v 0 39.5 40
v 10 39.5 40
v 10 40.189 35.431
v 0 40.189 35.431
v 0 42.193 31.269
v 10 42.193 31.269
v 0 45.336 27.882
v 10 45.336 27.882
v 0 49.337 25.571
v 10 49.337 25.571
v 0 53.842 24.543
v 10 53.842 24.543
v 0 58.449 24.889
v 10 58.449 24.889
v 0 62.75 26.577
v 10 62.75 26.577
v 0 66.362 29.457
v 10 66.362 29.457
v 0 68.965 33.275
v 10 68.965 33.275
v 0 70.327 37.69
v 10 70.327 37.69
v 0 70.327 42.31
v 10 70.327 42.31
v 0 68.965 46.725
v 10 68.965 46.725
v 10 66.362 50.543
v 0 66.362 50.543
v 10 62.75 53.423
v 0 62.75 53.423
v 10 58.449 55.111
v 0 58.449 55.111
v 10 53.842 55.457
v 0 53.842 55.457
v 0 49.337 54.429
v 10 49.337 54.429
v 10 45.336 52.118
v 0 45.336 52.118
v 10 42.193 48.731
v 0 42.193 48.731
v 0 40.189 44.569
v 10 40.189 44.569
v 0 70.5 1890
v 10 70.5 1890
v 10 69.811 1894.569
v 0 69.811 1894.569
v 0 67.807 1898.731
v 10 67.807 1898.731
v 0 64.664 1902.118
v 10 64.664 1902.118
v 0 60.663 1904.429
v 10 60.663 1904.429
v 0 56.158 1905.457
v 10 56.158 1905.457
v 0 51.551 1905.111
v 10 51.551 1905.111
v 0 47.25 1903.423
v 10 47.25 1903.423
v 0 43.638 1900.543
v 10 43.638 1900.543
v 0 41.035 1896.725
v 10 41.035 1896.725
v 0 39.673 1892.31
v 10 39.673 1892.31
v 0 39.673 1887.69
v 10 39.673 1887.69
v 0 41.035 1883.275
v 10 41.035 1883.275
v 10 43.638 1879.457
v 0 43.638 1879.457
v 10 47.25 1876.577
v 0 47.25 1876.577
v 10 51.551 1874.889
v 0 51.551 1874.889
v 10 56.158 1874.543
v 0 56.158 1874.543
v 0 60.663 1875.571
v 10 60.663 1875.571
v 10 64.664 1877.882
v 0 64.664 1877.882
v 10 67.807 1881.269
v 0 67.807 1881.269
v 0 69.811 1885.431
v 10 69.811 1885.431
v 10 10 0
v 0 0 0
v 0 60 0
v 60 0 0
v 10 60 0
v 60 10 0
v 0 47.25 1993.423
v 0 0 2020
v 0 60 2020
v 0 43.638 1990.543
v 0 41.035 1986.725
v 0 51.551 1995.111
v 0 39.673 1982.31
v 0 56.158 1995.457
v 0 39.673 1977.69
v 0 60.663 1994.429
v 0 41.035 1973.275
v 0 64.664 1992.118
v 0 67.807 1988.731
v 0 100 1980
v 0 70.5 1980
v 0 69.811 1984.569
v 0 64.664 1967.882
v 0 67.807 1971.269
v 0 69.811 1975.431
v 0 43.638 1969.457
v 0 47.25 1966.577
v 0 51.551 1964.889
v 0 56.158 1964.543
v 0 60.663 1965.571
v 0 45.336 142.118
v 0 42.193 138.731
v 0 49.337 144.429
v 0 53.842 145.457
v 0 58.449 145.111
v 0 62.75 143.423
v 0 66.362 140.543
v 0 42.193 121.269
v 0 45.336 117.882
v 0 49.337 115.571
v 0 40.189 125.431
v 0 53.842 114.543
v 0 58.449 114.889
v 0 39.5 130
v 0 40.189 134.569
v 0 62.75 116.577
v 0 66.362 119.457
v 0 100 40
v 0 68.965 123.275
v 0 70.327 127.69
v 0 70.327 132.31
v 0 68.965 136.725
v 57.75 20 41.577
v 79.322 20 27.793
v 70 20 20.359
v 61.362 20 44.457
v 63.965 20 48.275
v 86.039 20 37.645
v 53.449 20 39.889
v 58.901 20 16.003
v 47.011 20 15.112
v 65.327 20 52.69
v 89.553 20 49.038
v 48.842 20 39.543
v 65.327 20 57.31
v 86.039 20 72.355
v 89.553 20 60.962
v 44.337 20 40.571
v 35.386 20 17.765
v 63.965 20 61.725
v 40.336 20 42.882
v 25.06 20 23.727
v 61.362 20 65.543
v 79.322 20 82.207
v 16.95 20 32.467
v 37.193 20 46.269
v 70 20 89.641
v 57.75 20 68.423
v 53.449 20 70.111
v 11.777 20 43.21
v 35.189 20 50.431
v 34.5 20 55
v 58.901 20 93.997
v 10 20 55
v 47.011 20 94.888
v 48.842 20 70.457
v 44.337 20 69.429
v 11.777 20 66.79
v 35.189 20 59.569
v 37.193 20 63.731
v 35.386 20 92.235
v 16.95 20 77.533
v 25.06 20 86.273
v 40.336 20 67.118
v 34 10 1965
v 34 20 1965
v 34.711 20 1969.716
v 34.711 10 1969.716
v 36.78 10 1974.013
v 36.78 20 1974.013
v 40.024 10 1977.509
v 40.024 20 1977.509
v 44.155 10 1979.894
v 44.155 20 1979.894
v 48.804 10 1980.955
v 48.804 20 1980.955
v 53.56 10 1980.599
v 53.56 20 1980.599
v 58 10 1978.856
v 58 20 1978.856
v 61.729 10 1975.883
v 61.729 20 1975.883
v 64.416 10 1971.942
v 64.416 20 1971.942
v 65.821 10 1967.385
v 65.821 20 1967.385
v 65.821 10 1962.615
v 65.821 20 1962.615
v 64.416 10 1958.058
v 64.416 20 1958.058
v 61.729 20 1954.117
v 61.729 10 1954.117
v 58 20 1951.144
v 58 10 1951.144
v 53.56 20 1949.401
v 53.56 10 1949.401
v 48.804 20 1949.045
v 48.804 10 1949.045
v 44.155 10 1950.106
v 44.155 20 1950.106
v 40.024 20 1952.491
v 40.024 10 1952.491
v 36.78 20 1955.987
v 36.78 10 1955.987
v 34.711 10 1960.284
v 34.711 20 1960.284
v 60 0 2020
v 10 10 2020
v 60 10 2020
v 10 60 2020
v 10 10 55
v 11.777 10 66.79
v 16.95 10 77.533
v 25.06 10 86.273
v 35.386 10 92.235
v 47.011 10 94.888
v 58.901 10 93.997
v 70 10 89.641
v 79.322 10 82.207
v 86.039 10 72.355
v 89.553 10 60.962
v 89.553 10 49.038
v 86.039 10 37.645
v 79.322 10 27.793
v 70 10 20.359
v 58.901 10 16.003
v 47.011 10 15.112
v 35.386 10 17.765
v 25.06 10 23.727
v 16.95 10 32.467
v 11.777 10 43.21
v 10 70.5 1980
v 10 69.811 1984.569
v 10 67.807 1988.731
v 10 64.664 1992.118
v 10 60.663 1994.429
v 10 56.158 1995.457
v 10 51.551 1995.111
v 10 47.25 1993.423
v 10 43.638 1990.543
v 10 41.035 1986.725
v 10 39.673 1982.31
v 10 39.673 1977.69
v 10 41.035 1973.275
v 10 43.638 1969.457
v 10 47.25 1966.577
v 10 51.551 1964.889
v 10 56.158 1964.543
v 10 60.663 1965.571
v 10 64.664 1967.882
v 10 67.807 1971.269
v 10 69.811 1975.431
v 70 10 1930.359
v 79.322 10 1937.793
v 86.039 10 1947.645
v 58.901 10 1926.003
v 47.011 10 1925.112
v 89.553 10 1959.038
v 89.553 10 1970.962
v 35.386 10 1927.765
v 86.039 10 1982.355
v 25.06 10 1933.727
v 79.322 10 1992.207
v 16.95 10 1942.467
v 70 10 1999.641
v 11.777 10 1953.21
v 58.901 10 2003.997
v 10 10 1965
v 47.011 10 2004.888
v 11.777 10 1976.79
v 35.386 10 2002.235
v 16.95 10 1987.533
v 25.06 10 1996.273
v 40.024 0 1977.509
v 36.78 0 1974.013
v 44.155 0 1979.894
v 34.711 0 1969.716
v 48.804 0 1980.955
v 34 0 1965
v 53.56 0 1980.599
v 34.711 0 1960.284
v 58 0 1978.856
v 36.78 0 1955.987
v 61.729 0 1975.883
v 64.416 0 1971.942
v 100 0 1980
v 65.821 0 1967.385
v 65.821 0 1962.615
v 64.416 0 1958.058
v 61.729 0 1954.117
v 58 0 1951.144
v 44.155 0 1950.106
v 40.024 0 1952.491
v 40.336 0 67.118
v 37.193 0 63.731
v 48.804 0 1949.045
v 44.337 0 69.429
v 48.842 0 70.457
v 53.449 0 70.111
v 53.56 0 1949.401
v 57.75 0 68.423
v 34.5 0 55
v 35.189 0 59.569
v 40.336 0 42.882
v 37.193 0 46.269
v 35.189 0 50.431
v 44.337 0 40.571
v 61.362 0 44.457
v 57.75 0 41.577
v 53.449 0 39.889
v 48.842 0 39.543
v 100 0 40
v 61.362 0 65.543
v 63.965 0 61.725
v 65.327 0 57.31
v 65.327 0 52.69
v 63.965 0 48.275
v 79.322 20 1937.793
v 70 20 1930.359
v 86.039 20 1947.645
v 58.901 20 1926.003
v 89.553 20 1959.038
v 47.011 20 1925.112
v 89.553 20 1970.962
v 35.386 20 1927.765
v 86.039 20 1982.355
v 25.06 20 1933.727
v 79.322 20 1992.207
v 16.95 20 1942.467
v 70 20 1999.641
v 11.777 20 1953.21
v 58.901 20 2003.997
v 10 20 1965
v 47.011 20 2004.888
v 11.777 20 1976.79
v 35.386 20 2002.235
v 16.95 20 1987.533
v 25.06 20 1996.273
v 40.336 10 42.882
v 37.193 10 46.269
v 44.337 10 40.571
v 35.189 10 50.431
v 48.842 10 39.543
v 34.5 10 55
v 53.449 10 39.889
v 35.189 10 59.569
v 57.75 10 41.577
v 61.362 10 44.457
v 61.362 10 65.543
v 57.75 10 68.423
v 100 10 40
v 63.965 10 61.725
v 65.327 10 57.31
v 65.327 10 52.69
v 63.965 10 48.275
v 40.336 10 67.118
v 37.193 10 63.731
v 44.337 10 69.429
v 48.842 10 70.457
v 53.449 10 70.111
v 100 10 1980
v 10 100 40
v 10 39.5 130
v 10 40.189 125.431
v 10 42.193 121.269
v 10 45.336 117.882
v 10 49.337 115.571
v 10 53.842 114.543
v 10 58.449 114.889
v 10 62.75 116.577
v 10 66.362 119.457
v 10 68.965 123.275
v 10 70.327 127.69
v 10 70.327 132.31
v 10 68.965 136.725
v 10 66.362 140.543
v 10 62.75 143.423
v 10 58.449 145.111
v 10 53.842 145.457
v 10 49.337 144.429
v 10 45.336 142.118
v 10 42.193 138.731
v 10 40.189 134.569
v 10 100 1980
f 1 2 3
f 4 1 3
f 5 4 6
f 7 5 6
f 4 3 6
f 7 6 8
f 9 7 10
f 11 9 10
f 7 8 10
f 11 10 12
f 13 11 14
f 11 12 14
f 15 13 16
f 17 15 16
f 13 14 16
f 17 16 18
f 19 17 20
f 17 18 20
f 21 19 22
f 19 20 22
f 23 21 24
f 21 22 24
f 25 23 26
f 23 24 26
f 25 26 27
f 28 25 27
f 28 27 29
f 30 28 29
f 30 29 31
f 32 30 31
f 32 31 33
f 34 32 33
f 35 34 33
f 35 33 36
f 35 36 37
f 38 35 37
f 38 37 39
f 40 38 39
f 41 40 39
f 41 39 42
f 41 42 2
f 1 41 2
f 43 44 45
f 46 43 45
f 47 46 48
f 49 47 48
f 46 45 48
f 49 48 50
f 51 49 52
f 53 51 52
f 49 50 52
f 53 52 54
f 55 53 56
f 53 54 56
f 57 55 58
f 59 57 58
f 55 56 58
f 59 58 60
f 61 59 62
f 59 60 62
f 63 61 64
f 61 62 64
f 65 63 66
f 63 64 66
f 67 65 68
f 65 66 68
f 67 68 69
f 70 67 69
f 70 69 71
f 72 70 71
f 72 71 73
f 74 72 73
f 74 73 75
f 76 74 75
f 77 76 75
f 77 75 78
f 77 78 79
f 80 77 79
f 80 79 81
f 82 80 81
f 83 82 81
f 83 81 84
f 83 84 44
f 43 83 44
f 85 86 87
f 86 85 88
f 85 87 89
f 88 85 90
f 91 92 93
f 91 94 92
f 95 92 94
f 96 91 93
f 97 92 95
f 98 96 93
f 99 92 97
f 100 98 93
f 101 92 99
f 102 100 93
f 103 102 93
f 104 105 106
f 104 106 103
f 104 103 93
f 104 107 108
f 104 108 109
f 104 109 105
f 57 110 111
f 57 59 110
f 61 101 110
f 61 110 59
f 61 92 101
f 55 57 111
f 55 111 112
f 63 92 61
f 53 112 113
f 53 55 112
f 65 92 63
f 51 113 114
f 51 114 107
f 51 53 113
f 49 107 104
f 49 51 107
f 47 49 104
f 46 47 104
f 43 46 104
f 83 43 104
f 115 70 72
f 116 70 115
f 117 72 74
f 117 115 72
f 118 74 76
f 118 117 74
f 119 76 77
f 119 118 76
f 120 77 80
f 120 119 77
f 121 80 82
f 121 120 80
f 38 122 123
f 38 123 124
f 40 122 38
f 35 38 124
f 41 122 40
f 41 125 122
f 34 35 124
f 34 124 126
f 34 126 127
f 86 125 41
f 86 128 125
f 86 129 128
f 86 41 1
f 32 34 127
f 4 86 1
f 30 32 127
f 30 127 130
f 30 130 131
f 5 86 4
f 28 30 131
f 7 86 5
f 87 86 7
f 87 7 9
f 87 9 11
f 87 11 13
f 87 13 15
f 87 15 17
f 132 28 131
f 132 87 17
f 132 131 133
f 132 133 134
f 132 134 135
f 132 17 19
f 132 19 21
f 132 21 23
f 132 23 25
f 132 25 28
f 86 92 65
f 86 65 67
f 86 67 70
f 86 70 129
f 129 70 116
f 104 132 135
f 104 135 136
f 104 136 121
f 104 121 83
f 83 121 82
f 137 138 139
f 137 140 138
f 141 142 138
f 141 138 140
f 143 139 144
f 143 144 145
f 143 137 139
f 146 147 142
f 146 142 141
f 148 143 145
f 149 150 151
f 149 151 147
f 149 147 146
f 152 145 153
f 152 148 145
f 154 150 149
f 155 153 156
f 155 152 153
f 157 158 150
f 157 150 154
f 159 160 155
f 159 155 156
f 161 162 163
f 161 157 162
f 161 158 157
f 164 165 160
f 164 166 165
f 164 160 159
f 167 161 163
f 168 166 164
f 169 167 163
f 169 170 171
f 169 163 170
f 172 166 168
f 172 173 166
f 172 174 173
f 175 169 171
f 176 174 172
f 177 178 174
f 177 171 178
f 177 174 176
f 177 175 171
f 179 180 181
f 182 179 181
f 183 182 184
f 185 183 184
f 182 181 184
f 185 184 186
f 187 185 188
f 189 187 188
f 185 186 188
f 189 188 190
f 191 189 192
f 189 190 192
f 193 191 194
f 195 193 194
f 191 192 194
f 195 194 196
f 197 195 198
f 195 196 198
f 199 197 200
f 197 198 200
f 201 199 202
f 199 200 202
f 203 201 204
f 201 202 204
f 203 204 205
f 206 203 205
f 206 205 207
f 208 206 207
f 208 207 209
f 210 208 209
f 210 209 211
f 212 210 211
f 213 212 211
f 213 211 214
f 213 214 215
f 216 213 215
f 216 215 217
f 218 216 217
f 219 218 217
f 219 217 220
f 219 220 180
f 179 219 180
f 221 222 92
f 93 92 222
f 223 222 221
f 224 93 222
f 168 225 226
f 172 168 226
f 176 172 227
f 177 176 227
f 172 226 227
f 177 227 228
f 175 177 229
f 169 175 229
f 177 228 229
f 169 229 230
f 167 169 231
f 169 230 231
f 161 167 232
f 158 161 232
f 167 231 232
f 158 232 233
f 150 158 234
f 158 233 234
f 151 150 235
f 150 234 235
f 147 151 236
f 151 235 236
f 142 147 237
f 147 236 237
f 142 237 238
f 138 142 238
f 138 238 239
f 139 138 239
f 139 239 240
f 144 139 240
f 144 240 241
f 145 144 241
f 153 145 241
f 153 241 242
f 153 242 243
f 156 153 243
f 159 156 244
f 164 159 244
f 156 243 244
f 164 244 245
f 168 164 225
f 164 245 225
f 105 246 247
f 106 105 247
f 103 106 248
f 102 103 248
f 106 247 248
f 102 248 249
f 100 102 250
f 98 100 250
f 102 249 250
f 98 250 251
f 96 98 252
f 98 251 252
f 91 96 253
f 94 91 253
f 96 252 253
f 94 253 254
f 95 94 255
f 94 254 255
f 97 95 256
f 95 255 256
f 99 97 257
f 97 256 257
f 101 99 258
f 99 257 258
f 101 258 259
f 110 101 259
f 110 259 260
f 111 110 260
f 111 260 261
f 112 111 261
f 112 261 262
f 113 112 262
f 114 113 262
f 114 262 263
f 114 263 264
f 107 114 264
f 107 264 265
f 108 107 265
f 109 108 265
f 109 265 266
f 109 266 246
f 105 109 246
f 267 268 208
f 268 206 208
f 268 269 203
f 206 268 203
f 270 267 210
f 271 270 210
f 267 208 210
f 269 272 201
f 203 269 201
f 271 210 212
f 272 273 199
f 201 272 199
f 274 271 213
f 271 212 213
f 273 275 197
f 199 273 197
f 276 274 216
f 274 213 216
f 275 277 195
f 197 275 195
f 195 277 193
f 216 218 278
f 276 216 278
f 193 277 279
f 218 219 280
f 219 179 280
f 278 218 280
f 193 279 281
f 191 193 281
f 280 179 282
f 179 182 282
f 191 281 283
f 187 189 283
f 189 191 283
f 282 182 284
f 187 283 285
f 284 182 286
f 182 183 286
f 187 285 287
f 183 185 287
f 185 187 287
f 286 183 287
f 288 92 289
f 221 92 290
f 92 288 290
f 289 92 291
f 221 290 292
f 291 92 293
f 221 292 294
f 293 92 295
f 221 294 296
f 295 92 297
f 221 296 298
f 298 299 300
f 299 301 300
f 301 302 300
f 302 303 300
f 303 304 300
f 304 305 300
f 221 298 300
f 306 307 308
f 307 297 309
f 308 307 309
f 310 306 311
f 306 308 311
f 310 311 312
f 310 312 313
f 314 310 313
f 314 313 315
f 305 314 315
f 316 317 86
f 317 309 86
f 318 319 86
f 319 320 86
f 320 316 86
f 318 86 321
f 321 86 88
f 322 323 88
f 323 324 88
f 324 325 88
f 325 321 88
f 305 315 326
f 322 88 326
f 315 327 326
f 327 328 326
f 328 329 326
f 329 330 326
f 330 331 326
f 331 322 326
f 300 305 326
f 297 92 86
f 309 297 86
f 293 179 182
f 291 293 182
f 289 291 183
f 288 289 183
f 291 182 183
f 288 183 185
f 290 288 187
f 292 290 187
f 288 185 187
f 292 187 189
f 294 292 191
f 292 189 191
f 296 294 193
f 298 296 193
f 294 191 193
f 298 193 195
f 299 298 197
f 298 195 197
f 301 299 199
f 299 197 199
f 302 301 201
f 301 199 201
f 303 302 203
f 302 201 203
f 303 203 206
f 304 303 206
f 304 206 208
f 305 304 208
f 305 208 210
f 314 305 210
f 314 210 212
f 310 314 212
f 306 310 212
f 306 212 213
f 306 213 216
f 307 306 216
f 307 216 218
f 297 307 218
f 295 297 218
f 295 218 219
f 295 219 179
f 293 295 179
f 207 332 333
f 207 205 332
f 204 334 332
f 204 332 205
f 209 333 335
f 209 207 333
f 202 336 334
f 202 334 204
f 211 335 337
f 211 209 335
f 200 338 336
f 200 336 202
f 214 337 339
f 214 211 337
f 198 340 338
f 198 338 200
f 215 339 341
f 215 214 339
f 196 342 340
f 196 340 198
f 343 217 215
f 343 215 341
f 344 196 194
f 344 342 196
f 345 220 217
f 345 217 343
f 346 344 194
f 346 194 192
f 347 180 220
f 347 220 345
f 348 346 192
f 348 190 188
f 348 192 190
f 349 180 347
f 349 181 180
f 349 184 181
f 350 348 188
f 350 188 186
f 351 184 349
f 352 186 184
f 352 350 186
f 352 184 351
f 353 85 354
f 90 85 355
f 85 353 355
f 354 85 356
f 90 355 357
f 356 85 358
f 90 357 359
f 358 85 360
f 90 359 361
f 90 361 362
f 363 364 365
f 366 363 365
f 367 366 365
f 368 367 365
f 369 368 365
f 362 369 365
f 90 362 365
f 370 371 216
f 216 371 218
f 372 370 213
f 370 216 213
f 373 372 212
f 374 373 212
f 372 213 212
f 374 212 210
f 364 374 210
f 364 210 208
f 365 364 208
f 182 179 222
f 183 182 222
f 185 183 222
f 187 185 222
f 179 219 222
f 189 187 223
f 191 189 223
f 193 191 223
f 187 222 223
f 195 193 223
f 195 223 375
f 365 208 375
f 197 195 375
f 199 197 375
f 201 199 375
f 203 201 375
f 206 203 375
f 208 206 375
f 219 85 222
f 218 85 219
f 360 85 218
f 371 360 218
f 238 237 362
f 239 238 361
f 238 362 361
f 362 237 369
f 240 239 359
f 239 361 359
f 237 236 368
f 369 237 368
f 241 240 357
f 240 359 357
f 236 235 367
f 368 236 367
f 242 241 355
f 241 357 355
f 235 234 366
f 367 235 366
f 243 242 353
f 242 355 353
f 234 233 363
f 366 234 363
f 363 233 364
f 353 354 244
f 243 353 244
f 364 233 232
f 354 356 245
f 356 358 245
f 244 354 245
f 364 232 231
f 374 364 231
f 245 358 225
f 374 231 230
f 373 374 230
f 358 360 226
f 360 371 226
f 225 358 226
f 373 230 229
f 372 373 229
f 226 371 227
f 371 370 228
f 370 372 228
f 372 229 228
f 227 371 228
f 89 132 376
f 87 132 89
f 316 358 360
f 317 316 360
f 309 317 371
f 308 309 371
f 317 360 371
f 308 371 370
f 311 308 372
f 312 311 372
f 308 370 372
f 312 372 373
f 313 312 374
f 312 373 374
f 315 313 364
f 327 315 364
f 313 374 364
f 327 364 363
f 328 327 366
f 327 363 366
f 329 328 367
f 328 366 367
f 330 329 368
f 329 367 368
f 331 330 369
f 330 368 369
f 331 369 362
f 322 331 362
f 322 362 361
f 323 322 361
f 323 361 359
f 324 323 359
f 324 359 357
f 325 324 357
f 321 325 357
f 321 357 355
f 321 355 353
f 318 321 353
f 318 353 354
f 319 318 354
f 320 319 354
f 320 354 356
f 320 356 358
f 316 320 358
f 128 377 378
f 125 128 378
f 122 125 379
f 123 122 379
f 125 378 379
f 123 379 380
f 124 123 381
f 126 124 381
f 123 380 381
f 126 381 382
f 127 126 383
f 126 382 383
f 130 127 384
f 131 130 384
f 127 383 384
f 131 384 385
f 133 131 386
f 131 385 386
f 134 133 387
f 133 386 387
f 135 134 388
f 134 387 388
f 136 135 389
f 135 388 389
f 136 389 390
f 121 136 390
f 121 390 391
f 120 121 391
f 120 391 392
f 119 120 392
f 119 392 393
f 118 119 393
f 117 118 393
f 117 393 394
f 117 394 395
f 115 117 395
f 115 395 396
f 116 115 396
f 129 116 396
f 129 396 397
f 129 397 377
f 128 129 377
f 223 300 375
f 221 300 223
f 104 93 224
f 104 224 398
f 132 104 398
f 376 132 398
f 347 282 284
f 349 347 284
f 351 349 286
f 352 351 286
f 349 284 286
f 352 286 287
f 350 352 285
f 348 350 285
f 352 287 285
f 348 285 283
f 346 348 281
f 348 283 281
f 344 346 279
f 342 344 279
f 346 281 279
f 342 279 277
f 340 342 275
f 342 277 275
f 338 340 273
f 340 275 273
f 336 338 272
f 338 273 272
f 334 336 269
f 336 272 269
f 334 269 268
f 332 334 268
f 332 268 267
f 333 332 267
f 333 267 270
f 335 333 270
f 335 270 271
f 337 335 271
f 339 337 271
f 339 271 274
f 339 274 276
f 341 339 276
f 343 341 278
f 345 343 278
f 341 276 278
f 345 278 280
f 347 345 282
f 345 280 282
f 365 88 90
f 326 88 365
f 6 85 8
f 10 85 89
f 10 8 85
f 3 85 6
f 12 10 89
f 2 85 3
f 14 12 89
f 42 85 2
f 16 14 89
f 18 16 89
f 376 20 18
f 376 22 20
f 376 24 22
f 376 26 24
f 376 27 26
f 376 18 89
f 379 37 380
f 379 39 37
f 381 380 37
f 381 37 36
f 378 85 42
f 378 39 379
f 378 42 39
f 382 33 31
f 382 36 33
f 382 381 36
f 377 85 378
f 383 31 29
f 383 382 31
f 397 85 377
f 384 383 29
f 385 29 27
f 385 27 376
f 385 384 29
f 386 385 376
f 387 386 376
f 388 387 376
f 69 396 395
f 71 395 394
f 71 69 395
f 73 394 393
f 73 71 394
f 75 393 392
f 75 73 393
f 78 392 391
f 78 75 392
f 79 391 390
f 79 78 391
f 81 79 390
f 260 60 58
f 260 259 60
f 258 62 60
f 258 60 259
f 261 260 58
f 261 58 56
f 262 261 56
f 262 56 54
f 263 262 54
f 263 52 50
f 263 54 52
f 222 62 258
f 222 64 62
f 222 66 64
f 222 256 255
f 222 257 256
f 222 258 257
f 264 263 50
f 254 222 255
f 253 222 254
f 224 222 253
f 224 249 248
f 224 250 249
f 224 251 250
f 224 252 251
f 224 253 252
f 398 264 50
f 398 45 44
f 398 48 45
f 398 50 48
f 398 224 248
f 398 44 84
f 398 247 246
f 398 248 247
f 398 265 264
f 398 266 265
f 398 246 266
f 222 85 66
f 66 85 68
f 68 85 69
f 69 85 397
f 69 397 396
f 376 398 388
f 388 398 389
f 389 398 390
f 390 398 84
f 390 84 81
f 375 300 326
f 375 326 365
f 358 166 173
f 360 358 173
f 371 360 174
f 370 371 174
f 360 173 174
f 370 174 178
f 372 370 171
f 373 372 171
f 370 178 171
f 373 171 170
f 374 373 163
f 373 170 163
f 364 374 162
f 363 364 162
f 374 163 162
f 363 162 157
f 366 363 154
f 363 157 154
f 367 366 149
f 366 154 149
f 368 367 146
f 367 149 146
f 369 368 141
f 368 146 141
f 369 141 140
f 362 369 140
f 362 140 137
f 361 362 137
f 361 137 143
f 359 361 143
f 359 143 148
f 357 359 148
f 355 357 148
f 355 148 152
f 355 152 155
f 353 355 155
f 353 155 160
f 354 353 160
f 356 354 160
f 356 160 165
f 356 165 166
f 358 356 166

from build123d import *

# Parameters (mm, degrees)
SKETCH_1_W                = 100
SKETCH_1_H                = 100
EXTRUDE_1_DEPTH           = 2020
SKETCH_2_W                = 90
SKETCH_2_H                = 90
CUT_EXTRUDE_2_DEPTH       = 2025.944443682
SKETCH_3_R                = 15.5
CUT_EXTRUDE_3_DEPTH       = 2025.475240649
SKETCH_7_R                = 40
EXTRUDE_11_DEPTH          = 10
SKETCH_8_R                = 40
EXTRUDE_14_DEPTH          = 10
SKETCH_9_R                = 15.5
CUT_EXTRUDE_17_DEPTH      = 2025.055335212
SKETCH_11_R               = 16
CUT_EXTRUDE_18_DEPTH      = 2025.055335212
CUT_EXTRUDE_20_DEPTH      = 2025.475240649
CUT_EXTRUDE_20_DEPTH_BACK = 2025.475240649
CUT_EXTRUDE_21_DEPTH      = 2025.475240649
CUT_EXTRUDE_21_DEPTH_BACK = 2025.475240649
CUT_EXTRUDE_22_DEPTH      = 2025.475240649
CUT_EXTRUDE_22_DEPTH_BACK = 2025.475240649
CUT_EXTRUDE_23_DEPTH      = 2025.475240649
CUT_EXTRUDE_23_DEPTH_BACK = 2025.475240649


with BuildPart() as part:
    # 草图1 → 拉伸1 (new body)
    with BuildSketch(Plane.XY):
        with Locations((50, 50)):
            Rectangle(SKETCH_1_W, SKETCH_1_H)
    extrude(amount=EXTRUDE_1_DEPTH)

    # 草图2 → 拉伸2 (cut, through all)
    with BuildSketch(Plane.XY.offset(2020)):
        with Locations((55, 55)):
            Rectangle(SKETCH_2_W, SKETCH_2_H)
    extrude(amount=-CUT_EXTRUDE_2_DEPTH, mode=Mode.SUBTRACT)

    # 草图3 → 拉伸3 (cut, through all)
    with BuildSketch(Plane(origin=(10, 0, 0), x_dir=(0, 0, -1), z_dir=(1, 0, 0))):
        with Locations(Location((-1980, 55, 0), (0, 0, 90))):
            Circle(SKETCH_3_R)
        with Locations(Location((-1890, 55, 0), (0, 0, 90))):
            Circle(SKETCH_3_R)
        with Locations(Location((-130, 55, 0), (0, 0, 270))):
            Circle(SKETCH_3_R)
        with Locations(Location((-40, 55, 0), (0, 0, 270))):
            Circle(SKETCH_3_R)
    extrude(amount=-CUT_EXTRUDE_3_DEPTH, mode=Mode.SUBTRACT)


with BuildPart() as body_2:
    # 草图7 → 拉伸11 (new body)
    with BuildSketch(Plane(origin=(0, 10, 0), x_dir=(1, 0, 0), z_dir=(0, 1, 0))):
        with Locations(Location((50, -1965, 0), (0, 0, 180))):
            Circle(SKETCH_7_R)
    extrude(amount=EXTRUDE_11_DEPTH)


with BuildPart() as body_3:
    # 草图8 → 拉伸14 (new body)
    with BuildSketch(Plane(origin=(0, 10, 0), x_dir=(1, 0, 0), z_dir=(0, 1, 0))):
        with Locations(Location((50, -55, 0), (0, 0, 180))):
            Circle(SKETCH_8_R)
    extrude(amount=EXTRUDE_14_DEPTH)


with BuildPart() as cut_extrude_17_tool:
    # 草图9 → 拉伸17 (new, through all)
    with BuildSketch(Plane(origin=(0, 20, 0), x_dir=(1, 0, 0), z_dir=(0, 1, 0))):
        with Locations(Location((50, -55, 0), (0, 0, 180))):
            Circle(SKETCH_9_R)
    extrude(amount=-CUT_EXTRUDE_17_DEPTH)


with BuildPart() as part_1:
    add(part.part)

    # 拉伸17: cut by cut_extrude_17_tool
    add(cut_extrude_17_tool.part, mode=Mode.SUBTRACT)


with BuildPart() as body_3_1:
    add(body_3.part)

    # 拉伸17: cut by cut_extrude_17_tool
    add(cut_extrude_17_tool.part, mode=Mode.SUBTRACT)


with BuildPart() as cut_extrude_18_tool:
    # 草图11 → 拉伸18 (new, through all)
    with BuildSketch(Plane(origin=(0, 20, 0), x_dir=(1, 0, 0), z_dir=(0, 1, 0))):
        with Locations(Location((50, -1965, 0), (0, 0, 180))):
            Circle(SKETCH_11_R)
    extrude(amount=-CUT_EXTRUDE_18_DEPTH)


with BuildPart() as part_2:
    add(part_1.part)

    # 拉伸18: cut by cut_extrude_18_tool
    add(cut_extrude_18_tool.part, mode=Mode.SUBTRACT)

    # 草图15 → 拉伸20 (cut, two sides: drawn at the far end of the back side and taken through both)
    with BuildSketch(Plane(origin=(0, 10, 0), x_dir=(1, 0, 0), z_dir=(0, 1, 0)).offset(-CUT_EXTRUDE_20_DEPTH_BACK)):
        Polygon((-2805.042376275, -4885.042376275), (60, -2020), (100, -1980), (2965.042376275, 885.042376275), (8695.127128826, -4845.042376275), (2925.042376275, -10615.127128826), align=None)
    extrude(amount=CUT_EXTRUDE_20_DEPTH + CUT_EXTRUDE_20_DEPTH_BACK, mode=Mode.SUBTRACT)

    # 草图17 → 拉伸21 (cut, two sides: drawn at the far end of the back side and taken through both)
    with BuildSketch(Plane(origin=(0, 10, 0), x_dir=(1, 0, 0), z_dir=(0, 1, 0)).offset(-CUT_EXTRUDE_21_DEPTH_BACK)):
        Polygon((-2805.042376275, 2865.042376275), (60, 0), (100, -40), (2965.042376275, -2905.042376275), (8695.127128826, 2825.042376275), (2925.042376275, 8595.127128826), align=None)
    extrude(amount=CUT_EXTRUDE_21_DEPTH + CUT_EXTRUDE_21_DEPTH_BACK, mode=Mode.SUBTRACT)

    # 草图18 → 拉伸22 (cut, two sides: drawn at the far end of the back side and taken through both)
    with BuildSketch(Plane(origin=(10, 0, 0), x_dir=(0, 0, -1), z_dir=(1, 0, 0)).offset(-CUT_EXTRUDE_22_DEPTH_BACK)):
        Polygon((-2905.042376275, 2965.042376275), (-40, 100), (0, 60), (2865.042376275, -2805.042376275), (8595.127128826, 2925.042376275), (2825.042376275, 8695.127128826), align=None)
    extrude(amount=CUT_EXTRUDE_22_DEPTH + CUT_EXTRUDE_22_DEPTH_BACK, mode=Mode.SUBTRACT)

    # 草图19 → 拉伸23 (cut, two sides: drawn at the far end of the back side and taken through both)
    with BuildSketch(Plane(origin=(10, 0, 0), x_dir=(0, 0, -1), z_dir=(1, 0, 0)).offset(-CUT_EXTRUDE_23_DEPTH_BACK)):
        Polygon((-4885.042376275, -2805.042376275), (-2020, 60), (-1980, 100), (885.042376275, 2965.042376275), (-4845.042376275, 8695.127128826), (-10615.127128826, 2925.042376275), align=None)
    extrude(amount=CUT_EXTRUDE_23_DEPTH + CUT_EXTRUDE_23_DEPTH_BACK, mode=Mode.SUBTRACT)


with BuildPart() as body_2_1:
    add(body_2.part)

    # 拉伸18: cut by cut_extrude_18_tool
    add(cut_extrude_18_tool.part, mode=Mode.SUBTRACT)


solid = Compound([body_3_1.part, part_2.part, body_2_1.part])
